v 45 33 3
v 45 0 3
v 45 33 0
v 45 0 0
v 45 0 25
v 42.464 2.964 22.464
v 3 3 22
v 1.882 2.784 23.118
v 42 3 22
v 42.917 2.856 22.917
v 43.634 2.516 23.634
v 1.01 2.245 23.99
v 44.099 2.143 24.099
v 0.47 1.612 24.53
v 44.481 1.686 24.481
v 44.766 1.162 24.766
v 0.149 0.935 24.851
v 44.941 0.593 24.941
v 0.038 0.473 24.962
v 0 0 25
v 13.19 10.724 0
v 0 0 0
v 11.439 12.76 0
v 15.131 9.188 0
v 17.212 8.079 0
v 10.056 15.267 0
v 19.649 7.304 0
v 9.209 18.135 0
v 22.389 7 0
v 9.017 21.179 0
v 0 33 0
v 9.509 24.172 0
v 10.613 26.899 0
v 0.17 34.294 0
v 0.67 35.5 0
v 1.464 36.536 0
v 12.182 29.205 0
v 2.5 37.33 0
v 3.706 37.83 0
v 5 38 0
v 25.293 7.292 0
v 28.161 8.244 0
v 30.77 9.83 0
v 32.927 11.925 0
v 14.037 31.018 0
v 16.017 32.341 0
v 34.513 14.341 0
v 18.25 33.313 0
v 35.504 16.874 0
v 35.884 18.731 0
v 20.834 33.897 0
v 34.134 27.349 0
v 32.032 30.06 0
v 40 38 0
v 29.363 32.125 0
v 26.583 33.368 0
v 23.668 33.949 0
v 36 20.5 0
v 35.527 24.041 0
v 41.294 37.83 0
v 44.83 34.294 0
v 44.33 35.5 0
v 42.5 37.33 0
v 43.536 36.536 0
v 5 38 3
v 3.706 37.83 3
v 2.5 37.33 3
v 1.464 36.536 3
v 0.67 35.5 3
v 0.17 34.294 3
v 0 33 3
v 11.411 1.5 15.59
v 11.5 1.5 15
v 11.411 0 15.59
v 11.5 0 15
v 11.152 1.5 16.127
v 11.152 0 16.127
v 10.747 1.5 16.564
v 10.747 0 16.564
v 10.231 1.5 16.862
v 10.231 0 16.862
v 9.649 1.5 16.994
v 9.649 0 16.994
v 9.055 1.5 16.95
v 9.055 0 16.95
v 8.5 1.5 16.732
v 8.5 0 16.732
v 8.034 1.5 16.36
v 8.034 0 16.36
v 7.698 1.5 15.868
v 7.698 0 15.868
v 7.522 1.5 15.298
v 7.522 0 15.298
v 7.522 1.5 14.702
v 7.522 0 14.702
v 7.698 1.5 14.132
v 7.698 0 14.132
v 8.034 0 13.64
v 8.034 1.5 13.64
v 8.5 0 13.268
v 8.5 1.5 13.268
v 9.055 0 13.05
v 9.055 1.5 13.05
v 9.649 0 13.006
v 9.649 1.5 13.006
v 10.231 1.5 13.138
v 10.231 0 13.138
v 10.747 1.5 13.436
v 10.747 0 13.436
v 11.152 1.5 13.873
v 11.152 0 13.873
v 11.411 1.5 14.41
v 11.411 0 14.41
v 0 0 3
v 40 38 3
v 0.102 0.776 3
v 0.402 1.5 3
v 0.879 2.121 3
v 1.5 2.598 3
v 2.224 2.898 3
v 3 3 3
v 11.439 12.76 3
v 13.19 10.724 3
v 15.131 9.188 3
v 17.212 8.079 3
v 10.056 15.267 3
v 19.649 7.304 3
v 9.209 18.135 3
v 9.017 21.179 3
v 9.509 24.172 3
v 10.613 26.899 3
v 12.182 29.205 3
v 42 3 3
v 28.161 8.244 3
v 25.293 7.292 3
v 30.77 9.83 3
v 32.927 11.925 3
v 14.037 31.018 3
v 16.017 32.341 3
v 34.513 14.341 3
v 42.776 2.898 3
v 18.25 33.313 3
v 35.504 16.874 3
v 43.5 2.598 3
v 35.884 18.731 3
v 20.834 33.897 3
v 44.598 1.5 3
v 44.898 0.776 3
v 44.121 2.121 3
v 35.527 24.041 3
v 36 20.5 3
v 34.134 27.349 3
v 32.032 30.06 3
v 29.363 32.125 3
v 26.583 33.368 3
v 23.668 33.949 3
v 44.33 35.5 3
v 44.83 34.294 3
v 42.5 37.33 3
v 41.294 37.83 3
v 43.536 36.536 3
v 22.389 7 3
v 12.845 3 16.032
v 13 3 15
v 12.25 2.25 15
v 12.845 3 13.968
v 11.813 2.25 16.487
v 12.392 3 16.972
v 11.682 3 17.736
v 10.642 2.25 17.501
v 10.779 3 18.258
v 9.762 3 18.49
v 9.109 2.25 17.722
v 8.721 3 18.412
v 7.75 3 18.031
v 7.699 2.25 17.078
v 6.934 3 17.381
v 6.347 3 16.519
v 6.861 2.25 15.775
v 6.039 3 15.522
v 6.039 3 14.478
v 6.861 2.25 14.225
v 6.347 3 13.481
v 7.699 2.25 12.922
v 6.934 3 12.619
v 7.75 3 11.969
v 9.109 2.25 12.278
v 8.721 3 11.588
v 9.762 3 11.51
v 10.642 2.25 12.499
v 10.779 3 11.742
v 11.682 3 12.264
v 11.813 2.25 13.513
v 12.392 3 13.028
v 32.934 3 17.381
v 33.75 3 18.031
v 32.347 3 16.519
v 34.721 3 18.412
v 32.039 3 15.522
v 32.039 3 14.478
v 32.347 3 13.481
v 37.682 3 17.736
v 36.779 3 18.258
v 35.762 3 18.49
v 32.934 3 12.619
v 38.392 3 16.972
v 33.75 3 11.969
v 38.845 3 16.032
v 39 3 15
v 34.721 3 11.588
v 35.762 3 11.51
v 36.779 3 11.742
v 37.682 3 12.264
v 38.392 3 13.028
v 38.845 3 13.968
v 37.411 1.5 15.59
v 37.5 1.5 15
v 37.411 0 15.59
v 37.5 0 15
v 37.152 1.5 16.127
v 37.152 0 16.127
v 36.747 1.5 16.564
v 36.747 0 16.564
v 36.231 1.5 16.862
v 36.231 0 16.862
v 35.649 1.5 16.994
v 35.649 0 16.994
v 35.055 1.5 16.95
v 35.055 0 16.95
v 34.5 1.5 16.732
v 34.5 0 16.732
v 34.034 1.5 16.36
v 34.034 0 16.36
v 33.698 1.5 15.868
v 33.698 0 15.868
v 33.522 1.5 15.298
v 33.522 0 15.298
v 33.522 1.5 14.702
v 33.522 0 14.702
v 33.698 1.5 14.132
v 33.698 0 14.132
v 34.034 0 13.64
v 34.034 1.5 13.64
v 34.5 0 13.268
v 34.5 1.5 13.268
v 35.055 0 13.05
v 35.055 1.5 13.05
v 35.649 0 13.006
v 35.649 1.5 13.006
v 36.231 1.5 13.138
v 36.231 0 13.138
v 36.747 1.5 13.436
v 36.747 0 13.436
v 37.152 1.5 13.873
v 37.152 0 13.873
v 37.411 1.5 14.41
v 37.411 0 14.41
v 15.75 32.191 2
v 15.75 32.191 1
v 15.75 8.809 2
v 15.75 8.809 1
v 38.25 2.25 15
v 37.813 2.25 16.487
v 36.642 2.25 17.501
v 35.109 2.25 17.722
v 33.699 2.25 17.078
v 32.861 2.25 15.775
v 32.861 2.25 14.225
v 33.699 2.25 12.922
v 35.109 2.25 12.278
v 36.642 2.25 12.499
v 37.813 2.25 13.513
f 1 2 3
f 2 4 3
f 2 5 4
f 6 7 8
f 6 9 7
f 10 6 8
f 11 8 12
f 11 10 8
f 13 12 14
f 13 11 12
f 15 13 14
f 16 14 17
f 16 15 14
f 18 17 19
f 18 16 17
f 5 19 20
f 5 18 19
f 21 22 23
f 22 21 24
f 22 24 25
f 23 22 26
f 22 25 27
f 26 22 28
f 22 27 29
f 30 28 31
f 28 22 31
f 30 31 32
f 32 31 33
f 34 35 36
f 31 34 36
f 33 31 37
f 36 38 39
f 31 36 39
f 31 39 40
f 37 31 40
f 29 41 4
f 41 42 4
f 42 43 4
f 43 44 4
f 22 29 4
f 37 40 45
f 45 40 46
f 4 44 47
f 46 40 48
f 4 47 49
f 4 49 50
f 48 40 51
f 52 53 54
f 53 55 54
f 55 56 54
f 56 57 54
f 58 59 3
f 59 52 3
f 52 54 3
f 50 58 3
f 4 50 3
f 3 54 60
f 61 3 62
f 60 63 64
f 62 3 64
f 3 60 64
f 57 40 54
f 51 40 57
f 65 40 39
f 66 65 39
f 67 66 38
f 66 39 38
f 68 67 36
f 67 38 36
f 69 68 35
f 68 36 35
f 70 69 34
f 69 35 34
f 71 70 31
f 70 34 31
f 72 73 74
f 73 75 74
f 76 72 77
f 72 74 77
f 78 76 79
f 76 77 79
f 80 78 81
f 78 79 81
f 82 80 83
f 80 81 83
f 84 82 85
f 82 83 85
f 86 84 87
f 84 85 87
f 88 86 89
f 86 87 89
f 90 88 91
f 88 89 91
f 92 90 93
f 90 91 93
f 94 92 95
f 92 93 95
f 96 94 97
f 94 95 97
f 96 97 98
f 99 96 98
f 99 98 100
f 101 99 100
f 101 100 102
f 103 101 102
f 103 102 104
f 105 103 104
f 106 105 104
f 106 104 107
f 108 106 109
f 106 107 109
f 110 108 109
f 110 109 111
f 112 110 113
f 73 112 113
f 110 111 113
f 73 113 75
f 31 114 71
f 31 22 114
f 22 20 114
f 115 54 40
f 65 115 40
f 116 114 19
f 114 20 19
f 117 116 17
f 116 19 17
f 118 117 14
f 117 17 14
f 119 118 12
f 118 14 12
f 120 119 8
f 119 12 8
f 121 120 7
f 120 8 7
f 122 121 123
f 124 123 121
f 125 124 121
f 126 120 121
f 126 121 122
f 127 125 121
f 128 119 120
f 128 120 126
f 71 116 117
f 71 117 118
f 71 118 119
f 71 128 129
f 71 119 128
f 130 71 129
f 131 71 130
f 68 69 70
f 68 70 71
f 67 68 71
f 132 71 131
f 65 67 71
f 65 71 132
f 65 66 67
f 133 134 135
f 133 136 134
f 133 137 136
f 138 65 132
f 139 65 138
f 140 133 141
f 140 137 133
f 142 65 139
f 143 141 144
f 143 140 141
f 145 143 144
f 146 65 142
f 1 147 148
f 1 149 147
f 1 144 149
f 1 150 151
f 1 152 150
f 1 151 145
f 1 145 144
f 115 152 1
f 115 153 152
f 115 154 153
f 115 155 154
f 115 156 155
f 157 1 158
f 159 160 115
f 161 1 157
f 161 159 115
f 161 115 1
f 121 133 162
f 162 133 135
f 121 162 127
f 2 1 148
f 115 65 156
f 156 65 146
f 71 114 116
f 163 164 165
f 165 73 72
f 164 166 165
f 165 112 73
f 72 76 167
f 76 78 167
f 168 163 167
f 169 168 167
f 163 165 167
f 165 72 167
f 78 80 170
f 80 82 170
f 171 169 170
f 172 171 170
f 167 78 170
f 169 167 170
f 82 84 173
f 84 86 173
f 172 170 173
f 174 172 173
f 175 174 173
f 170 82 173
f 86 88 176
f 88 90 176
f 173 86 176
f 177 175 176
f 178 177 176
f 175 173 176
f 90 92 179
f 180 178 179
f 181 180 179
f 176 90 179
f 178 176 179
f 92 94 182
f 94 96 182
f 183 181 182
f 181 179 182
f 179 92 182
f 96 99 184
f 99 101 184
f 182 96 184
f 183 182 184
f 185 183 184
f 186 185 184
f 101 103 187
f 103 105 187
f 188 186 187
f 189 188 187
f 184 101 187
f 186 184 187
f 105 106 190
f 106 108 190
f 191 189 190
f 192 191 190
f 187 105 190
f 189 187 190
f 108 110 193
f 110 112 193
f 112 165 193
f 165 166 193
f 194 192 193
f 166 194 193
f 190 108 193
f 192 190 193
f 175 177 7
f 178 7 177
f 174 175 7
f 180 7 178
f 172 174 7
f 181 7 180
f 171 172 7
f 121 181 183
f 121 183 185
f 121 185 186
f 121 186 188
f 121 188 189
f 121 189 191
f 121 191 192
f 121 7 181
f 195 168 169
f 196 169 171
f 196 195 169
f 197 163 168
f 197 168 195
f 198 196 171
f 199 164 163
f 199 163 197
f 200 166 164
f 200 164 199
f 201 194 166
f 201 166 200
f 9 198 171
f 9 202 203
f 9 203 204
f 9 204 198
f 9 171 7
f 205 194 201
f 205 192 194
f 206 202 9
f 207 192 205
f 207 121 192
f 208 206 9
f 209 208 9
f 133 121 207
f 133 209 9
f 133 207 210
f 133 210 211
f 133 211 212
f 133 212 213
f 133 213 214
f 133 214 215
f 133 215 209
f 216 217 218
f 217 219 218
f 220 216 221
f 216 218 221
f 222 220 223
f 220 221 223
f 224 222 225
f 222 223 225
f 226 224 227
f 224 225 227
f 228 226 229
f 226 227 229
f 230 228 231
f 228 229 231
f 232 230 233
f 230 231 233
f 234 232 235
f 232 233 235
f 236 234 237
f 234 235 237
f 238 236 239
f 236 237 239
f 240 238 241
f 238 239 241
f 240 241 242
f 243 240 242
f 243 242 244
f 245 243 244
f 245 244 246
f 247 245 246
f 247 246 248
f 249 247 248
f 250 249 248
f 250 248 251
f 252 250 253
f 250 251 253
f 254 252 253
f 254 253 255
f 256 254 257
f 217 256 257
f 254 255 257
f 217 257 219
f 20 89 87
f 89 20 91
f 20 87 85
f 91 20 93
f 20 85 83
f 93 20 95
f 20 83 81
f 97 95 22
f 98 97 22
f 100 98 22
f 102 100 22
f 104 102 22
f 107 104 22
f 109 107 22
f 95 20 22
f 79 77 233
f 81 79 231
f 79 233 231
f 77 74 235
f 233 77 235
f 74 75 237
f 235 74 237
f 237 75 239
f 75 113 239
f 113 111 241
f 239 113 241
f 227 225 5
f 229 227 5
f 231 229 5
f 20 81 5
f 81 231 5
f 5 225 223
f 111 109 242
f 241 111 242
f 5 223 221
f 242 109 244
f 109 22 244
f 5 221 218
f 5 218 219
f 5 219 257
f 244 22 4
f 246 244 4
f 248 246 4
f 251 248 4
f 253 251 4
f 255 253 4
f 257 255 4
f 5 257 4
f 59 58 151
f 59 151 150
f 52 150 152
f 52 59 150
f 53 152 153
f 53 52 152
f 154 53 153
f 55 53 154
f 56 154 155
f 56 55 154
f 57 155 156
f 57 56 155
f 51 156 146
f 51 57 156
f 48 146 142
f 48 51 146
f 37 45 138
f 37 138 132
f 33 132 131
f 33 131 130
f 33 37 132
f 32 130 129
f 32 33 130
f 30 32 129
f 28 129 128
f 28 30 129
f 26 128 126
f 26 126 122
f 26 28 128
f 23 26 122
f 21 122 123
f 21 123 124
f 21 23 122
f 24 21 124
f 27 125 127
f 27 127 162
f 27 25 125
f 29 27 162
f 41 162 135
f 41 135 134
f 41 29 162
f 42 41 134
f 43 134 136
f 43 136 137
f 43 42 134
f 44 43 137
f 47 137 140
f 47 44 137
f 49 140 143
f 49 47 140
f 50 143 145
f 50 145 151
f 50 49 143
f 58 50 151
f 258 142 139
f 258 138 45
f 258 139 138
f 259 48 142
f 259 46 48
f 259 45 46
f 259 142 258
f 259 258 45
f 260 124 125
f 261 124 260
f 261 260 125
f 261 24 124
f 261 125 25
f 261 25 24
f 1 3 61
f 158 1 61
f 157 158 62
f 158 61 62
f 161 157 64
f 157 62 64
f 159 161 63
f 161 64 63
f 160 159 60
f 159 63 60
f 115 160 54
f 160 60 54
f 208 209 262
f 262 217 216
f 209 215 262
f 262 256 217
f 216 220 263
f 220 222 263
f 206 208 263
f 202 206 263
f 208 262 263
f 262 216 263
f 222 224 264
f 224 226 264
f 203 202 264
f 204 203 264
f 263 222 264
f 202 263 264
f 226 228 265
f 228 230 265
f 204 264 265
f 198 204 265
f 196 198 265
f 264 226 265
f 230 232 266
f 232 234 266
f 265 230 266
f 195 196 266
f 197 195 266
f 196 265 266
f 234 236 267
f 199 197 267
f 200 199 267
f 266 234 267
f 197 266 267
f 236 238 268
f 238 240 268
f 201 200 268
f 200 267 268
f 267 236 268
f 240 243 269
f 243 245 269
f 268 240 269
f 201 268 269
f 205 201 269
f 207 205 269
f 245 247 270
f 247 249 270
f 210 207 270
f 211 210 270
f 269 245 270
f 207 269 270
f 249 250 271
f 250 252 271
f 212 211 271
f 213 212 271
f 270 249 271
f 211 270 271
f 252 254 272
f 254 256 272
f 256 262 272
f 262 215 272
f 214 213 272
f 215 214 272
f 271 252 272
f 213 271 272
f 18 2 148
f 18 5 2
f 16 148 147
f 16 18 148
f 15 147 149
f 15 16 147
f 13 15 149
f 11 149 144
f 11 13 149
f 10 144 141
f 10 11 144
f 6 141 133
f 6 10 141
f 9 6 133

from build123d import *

# Parameters (mm, degrees)
F1_DEPTH       = 3
F0_W           = 45
F0_H           = 3
F2_DEPTH       = 25
F4_D           = 4
F4_CSINK_D     = 7
F4_CSINK_ANGLE = 90
F5_R           = 2.99999


# Not quite as in the source:
# - a fillet or chamfer is up to 0.001 mm smaller than in the source, because OpenCascade refuses the exact size


with BuildPart() as f1:
    # F0 (on Top) → F1 (new body)
    with BuildSketch(Plane.XY):
        with BuildLine():
            Line((0, 33), (0, 3))
            Line((0, 3), (45, 3))
            Line((45, 3), (45, 33))
            ThreePointArc((45, 33), (43.5355339059, 36.5355339059), (40, 38))
            Line((40, 38), (5, 38))
            ThreePointArc((5, 38), (1.4644660941, 36.5355339059), (0, 33))
        make_face()
        with BuildLine():
            add(Edge.make_bspline(
                [(36, 20.5), (36, 43.8826859022), (15.75, 32.1913429511), (-4.5, 20.5), (15.75, 8.8086570489), (36, -2.8826859022), (36, 20.5)],
                knots=[0, 0, 0, 2.0943951024, 2.0943951024, 4.1887902048, 4.1887902048, 6.2831853072, 6.2831853072, 6.2831853072], degree=2, weights=[1, 0.5, 1, 0.5, 1, 0.5, 1]))
        make_face(mode=Mode.SUBTRACT)
    extrude(amount=F1_DEPTH)

    # F0 (on Top) → F2 (join)
    with BuildSketch(Plane.XY):
        with Locations((22.5, 1.5)):
            Rectangle(F0_W, F0_H)
    extrude(amount=F2_DEPTH)

    # F4 (through all)
    with Locations(Plane(origin=(0, 3, 0), x_dir=(-1, 0, 0), z_dir=(0, 1, 0))):
        with Locations((-35.5, 15), (-9.5, 15)):
            CounterSinkHole(F4_D / 2, F4_CSINK_D / 2, counter_sink_angle=F4_CSINK_ANGLE)

    # F5 (radius 3 in the source; OpenCascade refuses exactly that, so slightly less here)
    f5_edges = [f1.edges().sort_by_distance(p)[0] for p in [
        (45, 3, 14),
        (22.5, 3, 25),
        (0, 3, 14),
    ]]
    fillet(f5_edges, radius=F5_R)


solid = f1.part
